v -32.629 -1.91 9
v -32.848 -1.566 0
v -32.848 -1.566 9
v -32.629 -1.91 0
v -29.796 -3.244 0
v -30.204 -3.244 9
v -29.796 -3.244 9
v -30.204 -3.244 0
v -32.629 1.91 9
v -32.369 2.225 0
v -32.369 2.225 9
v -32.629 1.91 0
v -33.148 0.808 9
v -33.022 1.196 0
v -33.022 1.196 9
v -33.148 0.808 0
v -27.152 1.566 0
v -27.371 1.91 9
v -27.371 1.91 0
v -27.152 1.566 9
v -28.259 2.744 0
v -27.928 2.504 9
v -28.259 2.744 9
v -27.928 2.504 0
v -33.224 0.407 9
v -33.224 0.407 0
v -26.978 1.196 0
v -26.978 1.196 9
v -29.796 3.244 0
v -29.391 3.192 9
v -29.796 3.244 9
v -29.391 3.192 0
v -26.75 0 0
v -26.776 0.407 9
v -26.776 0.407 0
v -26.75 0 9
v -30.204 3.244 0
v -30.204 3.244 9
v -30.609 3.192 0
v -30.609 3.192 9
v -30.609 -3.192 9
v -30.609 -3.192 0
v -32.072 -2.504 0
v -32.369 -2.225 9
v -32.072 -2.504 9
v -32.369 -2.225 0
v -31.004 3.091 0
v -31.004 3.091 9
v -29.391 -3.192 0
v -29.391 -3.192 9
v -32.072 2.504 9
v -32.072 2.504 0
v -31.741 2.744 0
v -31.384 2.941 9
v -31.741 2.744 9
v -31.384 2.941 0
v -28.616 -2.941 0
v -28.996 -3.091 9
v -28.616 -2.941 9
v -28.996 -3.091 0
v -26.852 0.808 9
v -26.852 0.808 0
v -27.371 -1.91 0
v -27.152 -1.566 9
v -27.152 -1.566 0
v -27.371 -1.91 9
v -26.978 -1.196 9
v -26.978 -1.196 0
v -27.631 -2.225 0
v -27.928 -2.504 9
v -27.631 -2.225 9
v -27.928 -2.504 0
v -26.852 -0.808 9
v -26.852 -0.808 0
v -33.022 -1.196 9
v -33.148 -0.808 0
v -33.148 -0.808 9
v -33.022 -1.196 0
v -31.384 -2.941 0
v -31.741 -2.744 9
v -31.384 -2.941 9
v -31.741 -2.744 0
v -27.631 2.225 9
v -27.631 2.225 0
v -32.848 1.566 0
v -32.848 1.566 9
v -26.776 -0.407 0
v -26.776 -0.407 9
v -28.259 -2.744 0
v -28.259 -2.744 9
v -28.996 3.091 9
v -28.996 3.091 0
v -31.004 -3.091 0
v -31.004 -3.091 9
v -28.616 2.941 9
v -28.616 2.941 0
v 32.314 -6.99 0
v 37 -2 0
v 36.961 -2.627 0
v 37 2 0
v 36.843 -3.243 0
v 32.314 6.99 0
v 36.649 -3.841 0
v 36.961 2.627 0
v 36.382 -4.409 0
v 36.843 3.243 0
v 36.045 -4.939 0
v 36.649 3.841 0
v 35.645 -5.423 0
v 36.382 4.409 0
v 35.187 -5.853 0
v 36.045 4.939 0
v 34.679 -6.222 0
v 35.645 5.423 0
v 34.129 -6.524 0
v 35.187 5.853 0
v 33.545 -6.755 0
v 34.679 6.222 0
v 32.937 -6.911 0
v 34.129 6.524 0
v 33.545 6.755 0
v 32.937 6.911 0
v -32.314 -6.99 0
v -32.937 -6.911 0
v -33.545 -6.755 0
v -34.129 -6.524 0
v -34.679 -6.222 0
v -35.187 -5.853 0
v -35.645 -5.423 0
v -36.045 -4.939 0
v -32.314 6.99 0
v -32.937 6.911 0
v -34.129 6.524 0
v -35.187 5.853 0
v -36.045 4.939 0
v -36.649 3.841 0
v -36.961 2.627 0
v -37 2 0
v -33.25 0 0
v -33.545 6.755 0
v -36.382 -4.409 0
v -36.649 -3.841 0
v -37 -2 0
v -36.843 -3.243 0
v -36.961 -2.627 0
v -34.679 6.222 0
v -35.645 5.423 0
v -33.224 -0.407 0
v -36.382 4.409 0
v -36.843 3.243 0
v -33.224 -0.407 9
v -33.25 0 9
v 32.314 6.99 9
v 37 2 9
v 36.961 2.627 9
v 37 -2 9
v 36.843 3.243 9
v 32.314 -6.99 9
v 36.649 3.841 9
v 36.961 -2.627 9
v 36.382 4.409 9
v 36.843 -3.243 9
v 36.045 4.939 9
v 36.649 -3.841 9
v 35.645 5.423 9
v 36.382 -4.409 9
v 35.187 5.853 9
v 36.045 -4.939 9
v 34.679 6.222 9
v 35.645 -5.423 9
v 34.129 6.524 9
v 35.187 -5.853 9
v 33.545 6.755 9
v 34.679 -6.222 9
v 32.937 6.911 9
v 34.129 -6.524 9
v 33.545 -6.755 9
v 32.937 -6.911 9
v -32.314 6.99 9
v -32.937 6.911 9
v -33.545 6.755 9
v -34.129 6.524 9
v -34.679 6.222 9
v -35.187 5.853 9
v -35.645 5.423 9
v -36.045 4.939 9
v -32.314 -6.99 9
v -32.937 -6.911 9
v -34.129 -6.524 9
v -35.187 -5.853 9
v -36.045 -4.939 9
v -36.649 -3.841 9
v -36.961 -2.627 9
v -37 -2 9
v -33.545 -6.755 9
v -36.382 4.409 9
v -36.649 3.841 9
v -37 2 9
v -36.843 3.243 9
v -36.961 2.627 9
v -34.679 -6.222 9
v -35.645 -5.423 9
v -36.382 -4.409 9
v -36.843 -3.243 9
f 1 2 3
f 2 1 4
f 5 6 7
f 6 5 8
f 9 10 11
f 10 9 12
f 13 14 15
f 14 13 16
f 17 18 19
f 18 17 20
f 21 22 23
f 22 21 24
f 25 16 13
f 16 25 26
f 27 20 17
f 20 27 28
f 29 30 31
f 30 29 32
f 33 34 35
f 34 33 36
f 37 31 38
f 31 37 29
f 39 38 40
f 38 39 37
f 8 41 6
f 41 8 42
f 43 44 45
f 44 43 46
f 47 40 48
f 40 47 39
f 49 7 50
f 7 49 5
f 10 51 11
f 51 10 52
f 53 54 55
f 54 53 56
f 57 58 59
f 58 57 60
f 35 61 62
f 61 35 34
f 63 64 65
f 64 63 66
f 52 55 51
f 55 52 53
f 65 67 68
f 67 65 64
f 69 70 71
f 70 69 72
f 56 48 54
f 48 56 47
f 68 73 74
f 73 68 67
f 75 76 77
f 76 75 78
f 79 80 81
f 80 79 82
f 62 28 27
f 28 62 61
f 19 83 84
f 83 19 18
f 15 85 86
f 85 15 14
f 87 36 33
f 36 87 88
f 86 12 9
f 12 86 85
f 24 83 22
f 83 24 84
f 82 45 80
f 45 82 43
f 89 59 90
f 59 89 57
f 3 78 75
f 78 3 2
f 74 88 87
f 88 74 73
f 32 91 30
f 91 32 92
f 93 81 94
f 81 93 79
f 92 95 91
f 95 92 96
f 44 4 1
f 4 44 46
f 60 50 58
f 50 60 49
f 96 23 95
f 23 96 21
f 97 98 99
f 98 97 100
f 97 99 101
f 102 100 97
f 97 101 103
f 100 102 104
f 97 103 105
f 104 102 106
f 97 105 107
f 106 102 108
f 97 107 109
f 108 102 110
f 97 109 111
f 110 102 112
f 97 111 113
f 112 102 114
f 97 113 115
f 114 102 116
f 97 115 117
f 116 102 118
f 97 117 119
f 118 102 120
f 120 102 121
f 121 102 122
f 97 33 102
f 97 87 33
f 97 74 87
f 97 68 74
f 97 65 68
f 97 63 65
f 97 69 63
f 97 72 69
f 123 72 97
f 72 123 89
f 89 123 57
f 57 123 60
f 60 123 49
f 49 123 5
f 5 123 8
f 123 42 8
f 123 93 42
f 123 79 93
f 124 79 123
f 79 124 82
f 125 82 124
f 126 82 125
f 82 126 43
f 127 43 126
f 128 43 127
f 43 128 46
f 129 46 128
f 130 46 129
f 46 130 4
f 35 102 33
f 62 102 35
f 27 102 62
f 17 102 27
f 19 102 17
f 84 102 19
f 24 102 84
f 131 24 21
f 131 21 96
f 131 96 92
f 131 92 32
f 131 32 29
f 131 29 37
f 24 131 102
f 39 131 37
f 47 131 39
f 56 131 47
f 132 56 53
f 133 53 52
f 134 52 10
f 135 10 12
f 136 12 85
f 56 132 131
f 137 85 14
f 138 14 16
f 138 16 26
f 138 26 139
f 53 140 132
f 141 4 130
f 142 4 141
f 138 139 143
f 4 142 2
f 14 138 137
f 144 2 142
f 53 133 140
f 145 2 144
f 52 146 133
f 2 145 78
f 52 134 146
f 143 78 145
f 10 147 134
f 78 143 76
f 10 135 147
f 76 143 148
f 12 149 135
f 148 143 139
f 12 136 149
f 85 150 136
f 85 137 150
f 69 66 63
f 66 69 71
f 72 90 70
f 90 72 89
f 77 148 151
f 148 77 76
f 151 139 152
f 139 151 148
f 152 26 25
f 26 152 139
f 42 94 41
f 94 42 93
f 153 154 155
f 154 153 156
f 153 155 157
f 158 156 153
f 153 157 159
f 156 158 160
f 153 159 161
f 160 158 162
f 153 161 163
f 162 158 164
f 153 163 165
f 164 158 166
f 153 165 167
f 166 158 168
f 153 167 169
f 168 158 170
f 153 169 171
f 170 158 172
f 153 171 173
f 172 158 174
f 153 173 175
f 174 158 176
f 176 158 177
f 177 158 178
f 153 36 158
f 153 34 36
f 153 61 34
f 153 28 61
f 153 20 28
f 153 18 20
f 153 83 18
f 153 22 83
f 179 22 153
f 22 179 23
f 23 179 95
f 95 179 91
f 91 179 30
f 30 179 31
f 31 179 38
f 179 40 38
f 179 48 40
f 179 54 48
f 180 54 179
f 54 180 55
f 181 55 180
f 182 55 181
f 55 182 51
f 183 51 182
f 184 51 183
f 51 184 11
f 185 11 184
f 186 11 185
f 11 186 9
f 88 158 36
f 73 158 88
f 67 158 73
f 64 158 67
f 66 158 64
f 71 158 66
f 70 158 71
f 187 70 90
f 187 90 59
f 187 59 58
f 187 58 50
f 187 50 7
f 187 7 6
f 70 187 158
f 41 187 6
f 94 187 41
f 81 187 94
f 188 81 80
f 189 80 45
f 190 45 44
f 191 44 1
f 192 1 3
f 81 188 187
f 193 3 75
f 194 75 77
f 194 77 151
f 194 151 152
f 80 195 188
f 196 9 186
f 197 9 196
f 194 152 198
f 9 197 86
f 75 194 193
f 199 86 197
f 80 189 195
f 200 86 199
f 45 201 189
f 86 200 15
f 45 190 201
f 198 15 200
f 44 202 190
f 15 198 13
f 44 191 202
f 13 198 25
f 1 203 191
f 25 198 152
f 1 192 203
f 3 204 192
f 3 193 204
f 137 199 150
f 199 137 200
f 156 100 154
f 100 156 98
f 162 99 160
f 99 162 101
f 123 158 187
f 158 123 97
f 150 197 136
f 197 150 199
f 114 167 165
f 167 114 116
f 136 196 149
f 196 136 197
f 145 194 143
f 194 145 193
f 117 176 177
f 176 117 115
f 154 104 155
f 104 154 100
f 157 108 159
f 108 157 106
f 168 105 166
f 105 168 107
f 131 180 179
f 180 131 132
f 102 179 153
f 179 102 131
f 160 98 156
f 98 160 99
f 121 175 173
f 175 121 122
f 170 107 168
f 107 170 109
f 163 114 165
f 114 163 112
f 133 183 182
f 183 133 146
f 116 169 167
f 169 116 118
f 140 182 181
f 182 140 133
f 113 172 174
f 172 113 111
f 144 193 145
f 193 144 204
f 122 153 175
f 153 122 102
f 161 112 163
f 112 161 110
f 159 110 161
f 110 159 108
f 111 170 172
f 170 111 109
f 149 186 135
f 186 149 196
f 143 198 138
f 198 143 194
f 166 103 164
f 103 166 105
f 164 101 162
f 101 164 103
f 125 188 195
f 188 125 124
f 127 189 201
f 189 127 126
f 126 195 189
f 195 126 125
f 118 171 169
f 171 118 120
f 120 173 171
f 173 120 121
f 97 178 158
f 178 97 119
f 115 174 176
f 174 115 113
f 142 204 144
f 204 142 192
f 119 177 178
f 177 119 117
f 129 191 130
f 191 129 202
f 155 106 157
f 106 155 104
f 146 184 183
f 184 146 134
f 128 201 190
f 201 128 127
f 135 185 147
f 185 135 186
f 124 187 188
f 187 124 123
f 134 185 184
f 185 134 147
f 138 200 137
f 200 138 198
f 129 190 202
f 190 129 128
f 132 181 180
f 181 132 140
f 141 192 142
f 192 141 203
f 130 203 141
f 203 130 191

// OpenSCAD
$fn = 50;


difference() {
	union() {
		hull() {
			translate(v = [-32.0000000000, 2.0000000000, 0]) {
				cylinder(h = 9, r = 5);
			}
			translate(v = [32.0000000000, 2.0000000000, 0]) {
				cylinder(h = 9, r = 5);
			}
			translate(v = [-32.0000000000, -2.0000000000, 0]) {
				cylinder(h = 9, r = 5);
			}
			translate(v = [32.0000000000, -2.0000000000, 0]) {
				cylinder(h = 9, r = 5);
			}
		}
	}
	union() {
		translate(v = [-30.0000000000, 0.0000000000, 0]) {
			cylinder(h = 9, r = 3.2500000000);
		}
		translate(v = [-30.0000000000, 0.0000000000, 0]) {
			cylinder(h = 9, r = 1.8000000000);
		}
		translate(v = [-30.0000000000, 0.0000000000, 0]) {
			cylinder(h = 9, r = 1.8000000000);
		}
		translate(v = [-30.0000000000, 0.0000000000, 0]) {
			cylinder(h = 9, r = 1.8000000000);
		}
	}
}
